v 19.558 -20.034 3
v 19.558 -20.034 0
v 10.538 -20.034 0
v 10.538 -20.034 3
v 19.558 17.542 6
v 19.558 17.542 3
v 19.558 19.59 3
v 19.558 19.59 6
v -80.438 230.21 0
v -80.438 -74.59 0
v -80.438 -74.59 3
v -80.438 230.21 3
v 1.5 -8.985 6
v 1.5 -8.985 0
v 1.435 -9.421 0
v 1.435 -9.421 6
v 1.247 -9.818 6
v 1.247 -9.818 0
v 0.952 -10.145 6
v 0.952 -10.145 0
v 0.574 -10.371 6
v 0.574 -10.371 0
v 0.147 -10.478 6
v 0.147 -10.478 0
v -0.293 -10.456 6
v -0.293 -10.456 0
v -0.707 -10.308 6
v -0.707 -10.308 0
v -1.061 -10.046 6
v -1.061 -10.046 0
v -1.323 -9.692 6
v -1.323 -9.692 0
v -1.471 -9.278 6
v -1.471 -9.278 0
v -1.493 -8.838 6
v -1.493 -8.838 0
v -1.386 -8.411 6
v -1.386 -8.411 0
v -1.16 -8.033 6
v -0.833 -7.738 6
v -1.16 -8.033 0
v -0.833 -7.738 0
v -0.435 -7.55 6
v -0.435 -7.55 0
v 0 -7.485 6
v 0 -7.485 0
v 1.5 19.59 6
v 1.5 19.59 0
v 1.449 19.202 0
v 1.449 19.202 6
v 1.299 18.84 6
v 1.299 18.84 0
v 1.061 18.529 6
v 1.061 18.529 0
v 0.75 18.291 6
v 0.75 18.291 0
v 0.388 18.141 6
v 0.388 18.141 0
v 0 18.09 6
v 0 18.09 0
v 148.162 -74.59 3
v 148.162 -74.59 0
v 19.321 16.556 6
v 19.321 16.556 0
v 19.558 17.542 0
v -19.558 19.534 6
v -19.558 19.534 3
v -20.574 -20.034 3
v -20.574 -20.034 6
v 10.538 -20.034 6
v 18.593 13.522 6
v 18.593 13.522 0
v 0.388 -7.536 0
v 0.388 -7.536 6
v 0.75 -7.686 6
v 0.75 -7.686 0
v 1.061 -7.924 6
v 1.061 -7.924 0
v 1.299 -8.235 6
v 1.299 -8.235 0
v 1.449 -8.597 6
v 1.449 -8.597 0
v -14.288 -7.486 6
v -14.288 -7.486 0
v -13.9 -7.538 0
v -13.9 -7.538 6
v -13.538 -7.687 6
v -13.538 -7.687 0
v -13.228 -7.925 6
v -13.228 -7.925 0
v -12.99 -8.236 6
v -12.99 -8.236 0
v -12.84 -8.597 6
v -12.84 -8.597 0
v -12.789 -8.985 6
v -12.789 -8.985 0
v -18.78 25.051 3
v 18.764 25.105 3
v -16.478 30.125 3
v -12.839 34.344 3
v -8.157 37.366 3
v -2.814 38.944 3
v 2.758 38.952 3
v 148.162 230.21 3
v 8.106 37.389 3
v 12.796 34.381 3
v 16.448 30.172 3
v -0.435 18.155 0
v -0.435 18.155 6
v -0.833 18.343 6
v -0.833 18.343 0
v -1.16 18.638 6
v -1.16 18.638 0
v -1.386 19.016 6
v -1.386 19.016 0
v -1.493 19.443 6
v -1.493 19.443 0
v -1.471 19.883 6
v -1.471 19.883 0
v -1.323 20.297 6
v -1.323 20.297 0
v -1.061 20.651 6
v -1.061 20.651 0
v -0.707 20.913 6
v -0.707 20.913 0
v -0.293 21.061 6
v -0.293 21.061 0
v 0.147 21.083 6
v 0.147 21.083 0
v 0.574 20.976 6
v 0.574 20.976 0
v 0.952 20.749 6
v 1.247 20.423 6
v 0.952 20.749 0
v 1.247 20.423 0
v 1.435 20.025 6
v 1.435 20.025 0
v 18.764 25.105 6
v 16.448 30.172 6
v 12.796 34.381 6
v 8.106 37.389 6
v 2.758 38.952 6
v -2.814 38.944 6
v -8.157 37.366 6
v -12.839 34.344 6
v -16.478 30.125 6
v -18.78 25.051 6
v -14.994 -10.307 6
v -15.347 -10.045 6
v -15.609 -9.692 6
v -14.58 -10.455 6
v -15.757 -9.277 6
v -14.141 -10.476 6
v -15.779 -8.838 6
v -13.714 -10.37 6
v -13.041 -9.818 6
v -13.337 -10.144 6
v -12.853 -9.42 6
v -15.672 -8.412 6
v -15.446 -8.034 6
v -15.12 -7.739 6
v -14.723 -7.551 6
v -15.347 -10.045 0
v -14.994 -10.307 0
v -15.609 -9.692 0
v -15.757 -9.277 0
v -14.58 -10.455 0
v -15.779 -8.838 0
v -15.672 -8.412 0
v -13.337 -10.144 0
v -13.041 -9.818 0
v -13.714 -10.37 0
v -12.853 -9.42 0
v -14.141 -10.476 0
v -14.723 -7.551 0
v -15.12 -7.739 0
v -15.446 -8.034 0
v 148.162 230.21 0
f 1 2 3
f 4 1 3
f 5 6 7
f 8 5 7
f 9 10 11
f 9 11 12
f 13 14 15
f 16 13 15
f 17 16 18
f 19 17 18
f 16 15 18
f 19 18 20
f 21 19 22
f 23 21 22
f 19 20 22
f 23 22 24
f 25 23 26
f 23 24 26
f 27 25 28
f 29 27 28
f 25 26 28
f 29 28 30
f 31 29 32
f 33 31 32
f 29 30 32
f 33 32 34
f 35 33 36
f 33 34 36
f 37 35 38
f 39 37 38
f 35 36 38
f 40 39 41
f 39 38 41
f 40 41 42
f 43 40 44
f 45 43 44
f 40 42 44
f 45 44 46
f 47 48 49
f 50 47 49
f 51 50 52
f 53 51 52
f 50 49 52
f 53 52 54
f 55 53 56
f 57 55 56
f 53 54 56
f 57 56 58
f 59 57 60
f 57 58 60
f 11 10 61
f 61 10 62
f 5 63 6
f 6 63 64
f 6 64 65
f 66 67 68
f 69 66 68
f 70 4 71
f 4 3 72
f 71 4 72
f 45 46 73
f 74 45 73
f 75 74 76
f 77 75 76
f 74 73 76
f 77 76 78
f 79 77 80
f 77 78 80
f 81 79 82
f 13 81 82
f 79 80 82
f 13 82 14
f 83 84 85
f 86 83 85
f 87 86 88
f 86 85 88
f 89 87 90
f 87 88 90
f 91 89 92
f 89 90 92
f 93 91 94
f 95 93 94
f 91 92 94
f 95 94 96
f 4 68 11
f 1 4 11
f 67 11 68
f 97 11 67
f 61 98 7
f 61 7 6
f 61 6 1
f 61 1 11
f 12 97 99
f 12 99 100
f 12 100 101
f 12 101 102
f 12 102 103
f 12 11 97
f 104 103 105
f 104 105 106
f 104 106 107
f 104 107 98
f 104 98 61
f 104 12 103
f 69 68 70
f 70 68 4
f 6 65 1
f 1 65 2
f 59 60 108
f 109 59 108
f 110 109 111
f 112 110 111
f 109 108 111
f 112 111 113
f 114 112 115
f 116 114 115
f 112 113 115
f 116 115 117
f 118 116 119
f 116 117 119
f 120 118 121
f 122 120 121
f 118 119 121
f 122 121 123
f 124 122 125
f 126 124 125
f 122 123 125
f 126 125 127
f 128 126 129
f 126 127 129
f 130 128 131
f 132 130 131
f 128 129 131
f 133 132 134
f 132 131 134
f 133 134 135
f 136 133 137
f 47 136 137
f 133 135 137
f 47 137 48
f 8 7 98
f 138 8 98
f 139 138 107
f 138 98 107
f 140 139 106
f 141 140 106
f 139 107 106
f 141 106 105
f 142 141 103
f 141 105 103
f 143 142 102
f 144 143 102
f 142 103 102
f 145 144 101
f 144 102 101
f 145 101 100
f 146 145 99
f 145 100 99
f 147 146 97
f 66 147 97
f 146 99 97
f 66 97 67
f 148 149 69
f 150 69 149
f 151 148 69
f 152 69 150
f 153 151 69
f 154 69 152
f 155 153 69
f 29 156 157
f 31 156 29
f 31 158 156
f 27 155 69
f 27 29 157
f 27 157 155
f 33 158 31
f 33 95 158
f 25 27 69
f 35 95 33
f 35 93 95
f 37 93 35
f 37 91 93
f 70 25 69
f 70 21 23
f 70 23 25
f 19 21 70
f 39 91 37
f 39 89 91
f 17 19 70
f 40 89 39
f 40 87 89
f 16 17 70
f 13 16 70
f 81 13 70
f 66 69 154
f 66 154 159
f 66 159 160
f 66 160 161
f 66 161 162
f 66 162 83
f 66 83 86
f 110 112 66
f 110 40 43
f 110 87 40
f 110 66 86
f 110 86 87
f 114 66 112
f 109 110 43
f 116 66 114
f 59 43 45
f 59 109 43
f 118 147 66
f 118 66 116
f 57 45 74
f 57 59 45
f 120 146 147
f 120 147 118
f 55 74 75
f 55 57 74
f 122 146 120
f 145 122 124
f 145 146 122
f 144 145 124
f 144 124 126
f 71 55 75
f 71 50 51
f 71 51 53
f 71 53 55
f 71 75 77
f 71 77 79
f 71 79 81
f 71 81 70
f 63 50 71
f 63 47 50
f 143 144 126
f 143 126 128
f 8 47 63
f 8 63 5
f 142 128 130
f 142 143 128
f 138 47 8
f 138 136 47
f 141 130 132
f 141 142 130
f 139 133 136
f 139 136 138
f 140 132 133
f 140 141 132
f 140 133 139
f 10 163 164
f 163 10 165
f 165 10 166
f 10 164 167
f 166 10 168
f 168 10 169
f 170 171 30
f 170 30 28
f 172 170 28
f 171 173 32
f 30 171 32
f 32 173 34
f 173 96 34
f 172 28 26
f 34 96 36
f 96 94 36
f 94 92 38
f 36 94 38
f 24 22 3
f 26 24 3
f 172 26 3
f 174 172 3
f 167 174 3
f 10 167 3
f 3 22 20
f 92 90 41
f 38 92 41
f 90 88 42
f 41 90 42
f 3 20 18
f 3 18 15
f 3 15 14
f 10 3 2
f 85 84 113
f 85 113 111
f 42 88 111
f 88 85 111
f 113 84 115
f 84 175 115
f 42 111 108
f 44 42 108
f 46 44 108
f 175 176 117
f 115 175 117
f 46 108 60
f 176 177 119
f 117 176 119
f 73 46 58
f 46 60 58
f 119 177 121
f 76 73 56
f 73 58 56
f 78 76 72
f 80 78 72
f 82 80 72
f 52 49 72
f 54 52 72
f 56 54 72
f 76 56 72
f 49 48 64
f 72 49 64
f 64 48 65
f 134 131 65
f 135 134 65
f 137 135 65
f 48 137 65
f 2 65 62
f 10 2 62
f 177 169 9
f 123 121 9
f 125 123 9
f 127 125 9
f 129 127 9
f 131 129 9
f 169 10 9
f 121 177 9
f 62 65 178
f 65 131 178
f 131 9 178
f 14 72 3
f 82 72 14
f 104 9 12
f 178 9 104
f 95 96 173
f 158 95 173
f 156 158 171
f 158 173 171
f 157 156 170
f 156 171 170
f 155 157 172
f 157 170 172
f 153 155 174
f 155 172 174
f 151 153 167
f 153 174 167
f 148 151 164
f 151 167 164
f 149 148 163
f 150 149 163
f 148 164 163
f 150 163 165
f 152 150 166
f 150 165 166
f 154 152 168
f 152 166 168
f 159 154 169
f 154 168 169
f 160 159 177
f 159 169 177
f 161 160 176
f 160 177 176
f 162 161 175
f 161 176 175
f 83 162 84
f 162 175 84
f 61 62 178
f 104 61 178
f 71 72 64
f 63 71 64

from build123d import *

# Parameters (mm, degrees)
F1_DEPTH = 6
F0_W     = 228.6
F0_H     = 304.8
F2_DEPTH = 3


with BuildPart() as f1:
    # F0 (on Top) → F1 (new body)
    with BuildSketch(Plane.XY):
        with BuildLine():
            Line((19.558, 17.5422988832), (19.558, 19.5899201751))
            ThreePointArc((19.558, 19.5899201751), (19.4987310228, 18.0684562421), (19.3212833112, 16.5562136621))
            Line((19.3212833112, 16.5562136621), (19.558, 17.5422988832))
        make_face()
        with BuildLine():
            Line((1.5, 19.5899201751), (19.558, 19.5899201751))
            ThreePointArc((19.558, 19.5899201751), (-0.0281086289, 39.1478999763), (-19.5579192049, 19.5337029753))
            ThreePointArc((-19.5579192049, 19.5337029753), (-13.8097043416, 5.7404642292), (0, 0.0319201751))
            Line((0, 0.0319201751), (0, 18.0899201751))
            ThreePointArc((0, 18.0899201751), (-1.0606601718, 20.6505803469), (1.5, 19.5899201751))
        make_face()
        with BuildLine():
            ThreePointArc((0, 0.0319201751), (-13.8097043416, 5.7404642292), (-19.5579192049, 19.5337029753))
            Line((-19.5579192049, 19.5337029753), (-20.574, -20.0340798249))
            Line((-20.574, -20.0340798249), (10.5375261573, -20.0340798249))
            Line((10.5375261573, -20.0340798249), (18.5929127749, 13.5220574091))
            ThreePointArc((18.5929127749, 13.5220574091), (11.4856454765, 3.7597176499), (0, 0.0319201751))
        make_face()
        with BuildLine():
            ThreePointArc((-12.7889, -8.9850798249), (-15.3471702223, -10.0447500472), (-14.2875, -7.4864798249))
            ThreePointArc((-14.2875, -7.4864798249), (-13.2278297777, -7.9254096026), (-12.7889, -8.9850798249))
        make_face(mode=Mode.SUBTRACT)
        with BuildLine():
            ThreePointArc((1.5, -8.9850798249), (-1.0606601718, -10.0457399967), (0, -7.4850798249))
            ThreePointArc((0, -7.4850798249), (1.0606601718, -7.9244196531), (1.5, -8.9850798249))
        make_face(mode=Mode.SUBTRACT)
        with BuildLine():
            ThreePointArc((19.3212833112, 16.5562136621), (19.4987310228, 18.0684562421), (19.558, 19.5899201751))
            Line((19.558, 19.5899201751), (1.5, 19.5899201751))
            ThreePointArc((1.5, 19.5899201751), (1.0606601718, 18.5292600033), (0, 18.0899201751))
            Line((0, 18.0899201751), (0, 0.0319201751))
            ThreePointArc((0, 0.0319201751), (11.4856454765, 3.7597176499), (18.5929127749, 13.5220574091))
            Line((18.5929127749, 13.5220574091), (19.3212833112, 16.5562136621))
        make_face()
    extrude(amount=F1_DEPTH)

    # F0 (on Top) → F2 (join)
    with BuildSketch(Plane.XY):
        with Locations((33.862138617, 77.8095703363)):
            Rectangle(F0_W, F0_H)
        with BuildLine():
            ThreePointArc((-19.5579192049, 19.5337029753), (-0.0281086289, 39.1478999763), (19.558, 19.5899201751))
            Line((19.558, 19.5899201751), (19.558, 17.5422988832))
            Line((19.558, 17.5422988832), (19.558, -20.0340798249))
            Line((19.558, -20.0340798249), (10.5375261573, -20.0340798249))
            Line((10.5375261573, -20.0340798249), (-20.574, -20.0340798249))
            Line((-20.574, -20.0340798249), (-19.5579192049, 19.5337029753))
        make_face(mode=Mode.SUBTRACT)
    extrude(amount=F2_DEPTH)


solid = f1.part
